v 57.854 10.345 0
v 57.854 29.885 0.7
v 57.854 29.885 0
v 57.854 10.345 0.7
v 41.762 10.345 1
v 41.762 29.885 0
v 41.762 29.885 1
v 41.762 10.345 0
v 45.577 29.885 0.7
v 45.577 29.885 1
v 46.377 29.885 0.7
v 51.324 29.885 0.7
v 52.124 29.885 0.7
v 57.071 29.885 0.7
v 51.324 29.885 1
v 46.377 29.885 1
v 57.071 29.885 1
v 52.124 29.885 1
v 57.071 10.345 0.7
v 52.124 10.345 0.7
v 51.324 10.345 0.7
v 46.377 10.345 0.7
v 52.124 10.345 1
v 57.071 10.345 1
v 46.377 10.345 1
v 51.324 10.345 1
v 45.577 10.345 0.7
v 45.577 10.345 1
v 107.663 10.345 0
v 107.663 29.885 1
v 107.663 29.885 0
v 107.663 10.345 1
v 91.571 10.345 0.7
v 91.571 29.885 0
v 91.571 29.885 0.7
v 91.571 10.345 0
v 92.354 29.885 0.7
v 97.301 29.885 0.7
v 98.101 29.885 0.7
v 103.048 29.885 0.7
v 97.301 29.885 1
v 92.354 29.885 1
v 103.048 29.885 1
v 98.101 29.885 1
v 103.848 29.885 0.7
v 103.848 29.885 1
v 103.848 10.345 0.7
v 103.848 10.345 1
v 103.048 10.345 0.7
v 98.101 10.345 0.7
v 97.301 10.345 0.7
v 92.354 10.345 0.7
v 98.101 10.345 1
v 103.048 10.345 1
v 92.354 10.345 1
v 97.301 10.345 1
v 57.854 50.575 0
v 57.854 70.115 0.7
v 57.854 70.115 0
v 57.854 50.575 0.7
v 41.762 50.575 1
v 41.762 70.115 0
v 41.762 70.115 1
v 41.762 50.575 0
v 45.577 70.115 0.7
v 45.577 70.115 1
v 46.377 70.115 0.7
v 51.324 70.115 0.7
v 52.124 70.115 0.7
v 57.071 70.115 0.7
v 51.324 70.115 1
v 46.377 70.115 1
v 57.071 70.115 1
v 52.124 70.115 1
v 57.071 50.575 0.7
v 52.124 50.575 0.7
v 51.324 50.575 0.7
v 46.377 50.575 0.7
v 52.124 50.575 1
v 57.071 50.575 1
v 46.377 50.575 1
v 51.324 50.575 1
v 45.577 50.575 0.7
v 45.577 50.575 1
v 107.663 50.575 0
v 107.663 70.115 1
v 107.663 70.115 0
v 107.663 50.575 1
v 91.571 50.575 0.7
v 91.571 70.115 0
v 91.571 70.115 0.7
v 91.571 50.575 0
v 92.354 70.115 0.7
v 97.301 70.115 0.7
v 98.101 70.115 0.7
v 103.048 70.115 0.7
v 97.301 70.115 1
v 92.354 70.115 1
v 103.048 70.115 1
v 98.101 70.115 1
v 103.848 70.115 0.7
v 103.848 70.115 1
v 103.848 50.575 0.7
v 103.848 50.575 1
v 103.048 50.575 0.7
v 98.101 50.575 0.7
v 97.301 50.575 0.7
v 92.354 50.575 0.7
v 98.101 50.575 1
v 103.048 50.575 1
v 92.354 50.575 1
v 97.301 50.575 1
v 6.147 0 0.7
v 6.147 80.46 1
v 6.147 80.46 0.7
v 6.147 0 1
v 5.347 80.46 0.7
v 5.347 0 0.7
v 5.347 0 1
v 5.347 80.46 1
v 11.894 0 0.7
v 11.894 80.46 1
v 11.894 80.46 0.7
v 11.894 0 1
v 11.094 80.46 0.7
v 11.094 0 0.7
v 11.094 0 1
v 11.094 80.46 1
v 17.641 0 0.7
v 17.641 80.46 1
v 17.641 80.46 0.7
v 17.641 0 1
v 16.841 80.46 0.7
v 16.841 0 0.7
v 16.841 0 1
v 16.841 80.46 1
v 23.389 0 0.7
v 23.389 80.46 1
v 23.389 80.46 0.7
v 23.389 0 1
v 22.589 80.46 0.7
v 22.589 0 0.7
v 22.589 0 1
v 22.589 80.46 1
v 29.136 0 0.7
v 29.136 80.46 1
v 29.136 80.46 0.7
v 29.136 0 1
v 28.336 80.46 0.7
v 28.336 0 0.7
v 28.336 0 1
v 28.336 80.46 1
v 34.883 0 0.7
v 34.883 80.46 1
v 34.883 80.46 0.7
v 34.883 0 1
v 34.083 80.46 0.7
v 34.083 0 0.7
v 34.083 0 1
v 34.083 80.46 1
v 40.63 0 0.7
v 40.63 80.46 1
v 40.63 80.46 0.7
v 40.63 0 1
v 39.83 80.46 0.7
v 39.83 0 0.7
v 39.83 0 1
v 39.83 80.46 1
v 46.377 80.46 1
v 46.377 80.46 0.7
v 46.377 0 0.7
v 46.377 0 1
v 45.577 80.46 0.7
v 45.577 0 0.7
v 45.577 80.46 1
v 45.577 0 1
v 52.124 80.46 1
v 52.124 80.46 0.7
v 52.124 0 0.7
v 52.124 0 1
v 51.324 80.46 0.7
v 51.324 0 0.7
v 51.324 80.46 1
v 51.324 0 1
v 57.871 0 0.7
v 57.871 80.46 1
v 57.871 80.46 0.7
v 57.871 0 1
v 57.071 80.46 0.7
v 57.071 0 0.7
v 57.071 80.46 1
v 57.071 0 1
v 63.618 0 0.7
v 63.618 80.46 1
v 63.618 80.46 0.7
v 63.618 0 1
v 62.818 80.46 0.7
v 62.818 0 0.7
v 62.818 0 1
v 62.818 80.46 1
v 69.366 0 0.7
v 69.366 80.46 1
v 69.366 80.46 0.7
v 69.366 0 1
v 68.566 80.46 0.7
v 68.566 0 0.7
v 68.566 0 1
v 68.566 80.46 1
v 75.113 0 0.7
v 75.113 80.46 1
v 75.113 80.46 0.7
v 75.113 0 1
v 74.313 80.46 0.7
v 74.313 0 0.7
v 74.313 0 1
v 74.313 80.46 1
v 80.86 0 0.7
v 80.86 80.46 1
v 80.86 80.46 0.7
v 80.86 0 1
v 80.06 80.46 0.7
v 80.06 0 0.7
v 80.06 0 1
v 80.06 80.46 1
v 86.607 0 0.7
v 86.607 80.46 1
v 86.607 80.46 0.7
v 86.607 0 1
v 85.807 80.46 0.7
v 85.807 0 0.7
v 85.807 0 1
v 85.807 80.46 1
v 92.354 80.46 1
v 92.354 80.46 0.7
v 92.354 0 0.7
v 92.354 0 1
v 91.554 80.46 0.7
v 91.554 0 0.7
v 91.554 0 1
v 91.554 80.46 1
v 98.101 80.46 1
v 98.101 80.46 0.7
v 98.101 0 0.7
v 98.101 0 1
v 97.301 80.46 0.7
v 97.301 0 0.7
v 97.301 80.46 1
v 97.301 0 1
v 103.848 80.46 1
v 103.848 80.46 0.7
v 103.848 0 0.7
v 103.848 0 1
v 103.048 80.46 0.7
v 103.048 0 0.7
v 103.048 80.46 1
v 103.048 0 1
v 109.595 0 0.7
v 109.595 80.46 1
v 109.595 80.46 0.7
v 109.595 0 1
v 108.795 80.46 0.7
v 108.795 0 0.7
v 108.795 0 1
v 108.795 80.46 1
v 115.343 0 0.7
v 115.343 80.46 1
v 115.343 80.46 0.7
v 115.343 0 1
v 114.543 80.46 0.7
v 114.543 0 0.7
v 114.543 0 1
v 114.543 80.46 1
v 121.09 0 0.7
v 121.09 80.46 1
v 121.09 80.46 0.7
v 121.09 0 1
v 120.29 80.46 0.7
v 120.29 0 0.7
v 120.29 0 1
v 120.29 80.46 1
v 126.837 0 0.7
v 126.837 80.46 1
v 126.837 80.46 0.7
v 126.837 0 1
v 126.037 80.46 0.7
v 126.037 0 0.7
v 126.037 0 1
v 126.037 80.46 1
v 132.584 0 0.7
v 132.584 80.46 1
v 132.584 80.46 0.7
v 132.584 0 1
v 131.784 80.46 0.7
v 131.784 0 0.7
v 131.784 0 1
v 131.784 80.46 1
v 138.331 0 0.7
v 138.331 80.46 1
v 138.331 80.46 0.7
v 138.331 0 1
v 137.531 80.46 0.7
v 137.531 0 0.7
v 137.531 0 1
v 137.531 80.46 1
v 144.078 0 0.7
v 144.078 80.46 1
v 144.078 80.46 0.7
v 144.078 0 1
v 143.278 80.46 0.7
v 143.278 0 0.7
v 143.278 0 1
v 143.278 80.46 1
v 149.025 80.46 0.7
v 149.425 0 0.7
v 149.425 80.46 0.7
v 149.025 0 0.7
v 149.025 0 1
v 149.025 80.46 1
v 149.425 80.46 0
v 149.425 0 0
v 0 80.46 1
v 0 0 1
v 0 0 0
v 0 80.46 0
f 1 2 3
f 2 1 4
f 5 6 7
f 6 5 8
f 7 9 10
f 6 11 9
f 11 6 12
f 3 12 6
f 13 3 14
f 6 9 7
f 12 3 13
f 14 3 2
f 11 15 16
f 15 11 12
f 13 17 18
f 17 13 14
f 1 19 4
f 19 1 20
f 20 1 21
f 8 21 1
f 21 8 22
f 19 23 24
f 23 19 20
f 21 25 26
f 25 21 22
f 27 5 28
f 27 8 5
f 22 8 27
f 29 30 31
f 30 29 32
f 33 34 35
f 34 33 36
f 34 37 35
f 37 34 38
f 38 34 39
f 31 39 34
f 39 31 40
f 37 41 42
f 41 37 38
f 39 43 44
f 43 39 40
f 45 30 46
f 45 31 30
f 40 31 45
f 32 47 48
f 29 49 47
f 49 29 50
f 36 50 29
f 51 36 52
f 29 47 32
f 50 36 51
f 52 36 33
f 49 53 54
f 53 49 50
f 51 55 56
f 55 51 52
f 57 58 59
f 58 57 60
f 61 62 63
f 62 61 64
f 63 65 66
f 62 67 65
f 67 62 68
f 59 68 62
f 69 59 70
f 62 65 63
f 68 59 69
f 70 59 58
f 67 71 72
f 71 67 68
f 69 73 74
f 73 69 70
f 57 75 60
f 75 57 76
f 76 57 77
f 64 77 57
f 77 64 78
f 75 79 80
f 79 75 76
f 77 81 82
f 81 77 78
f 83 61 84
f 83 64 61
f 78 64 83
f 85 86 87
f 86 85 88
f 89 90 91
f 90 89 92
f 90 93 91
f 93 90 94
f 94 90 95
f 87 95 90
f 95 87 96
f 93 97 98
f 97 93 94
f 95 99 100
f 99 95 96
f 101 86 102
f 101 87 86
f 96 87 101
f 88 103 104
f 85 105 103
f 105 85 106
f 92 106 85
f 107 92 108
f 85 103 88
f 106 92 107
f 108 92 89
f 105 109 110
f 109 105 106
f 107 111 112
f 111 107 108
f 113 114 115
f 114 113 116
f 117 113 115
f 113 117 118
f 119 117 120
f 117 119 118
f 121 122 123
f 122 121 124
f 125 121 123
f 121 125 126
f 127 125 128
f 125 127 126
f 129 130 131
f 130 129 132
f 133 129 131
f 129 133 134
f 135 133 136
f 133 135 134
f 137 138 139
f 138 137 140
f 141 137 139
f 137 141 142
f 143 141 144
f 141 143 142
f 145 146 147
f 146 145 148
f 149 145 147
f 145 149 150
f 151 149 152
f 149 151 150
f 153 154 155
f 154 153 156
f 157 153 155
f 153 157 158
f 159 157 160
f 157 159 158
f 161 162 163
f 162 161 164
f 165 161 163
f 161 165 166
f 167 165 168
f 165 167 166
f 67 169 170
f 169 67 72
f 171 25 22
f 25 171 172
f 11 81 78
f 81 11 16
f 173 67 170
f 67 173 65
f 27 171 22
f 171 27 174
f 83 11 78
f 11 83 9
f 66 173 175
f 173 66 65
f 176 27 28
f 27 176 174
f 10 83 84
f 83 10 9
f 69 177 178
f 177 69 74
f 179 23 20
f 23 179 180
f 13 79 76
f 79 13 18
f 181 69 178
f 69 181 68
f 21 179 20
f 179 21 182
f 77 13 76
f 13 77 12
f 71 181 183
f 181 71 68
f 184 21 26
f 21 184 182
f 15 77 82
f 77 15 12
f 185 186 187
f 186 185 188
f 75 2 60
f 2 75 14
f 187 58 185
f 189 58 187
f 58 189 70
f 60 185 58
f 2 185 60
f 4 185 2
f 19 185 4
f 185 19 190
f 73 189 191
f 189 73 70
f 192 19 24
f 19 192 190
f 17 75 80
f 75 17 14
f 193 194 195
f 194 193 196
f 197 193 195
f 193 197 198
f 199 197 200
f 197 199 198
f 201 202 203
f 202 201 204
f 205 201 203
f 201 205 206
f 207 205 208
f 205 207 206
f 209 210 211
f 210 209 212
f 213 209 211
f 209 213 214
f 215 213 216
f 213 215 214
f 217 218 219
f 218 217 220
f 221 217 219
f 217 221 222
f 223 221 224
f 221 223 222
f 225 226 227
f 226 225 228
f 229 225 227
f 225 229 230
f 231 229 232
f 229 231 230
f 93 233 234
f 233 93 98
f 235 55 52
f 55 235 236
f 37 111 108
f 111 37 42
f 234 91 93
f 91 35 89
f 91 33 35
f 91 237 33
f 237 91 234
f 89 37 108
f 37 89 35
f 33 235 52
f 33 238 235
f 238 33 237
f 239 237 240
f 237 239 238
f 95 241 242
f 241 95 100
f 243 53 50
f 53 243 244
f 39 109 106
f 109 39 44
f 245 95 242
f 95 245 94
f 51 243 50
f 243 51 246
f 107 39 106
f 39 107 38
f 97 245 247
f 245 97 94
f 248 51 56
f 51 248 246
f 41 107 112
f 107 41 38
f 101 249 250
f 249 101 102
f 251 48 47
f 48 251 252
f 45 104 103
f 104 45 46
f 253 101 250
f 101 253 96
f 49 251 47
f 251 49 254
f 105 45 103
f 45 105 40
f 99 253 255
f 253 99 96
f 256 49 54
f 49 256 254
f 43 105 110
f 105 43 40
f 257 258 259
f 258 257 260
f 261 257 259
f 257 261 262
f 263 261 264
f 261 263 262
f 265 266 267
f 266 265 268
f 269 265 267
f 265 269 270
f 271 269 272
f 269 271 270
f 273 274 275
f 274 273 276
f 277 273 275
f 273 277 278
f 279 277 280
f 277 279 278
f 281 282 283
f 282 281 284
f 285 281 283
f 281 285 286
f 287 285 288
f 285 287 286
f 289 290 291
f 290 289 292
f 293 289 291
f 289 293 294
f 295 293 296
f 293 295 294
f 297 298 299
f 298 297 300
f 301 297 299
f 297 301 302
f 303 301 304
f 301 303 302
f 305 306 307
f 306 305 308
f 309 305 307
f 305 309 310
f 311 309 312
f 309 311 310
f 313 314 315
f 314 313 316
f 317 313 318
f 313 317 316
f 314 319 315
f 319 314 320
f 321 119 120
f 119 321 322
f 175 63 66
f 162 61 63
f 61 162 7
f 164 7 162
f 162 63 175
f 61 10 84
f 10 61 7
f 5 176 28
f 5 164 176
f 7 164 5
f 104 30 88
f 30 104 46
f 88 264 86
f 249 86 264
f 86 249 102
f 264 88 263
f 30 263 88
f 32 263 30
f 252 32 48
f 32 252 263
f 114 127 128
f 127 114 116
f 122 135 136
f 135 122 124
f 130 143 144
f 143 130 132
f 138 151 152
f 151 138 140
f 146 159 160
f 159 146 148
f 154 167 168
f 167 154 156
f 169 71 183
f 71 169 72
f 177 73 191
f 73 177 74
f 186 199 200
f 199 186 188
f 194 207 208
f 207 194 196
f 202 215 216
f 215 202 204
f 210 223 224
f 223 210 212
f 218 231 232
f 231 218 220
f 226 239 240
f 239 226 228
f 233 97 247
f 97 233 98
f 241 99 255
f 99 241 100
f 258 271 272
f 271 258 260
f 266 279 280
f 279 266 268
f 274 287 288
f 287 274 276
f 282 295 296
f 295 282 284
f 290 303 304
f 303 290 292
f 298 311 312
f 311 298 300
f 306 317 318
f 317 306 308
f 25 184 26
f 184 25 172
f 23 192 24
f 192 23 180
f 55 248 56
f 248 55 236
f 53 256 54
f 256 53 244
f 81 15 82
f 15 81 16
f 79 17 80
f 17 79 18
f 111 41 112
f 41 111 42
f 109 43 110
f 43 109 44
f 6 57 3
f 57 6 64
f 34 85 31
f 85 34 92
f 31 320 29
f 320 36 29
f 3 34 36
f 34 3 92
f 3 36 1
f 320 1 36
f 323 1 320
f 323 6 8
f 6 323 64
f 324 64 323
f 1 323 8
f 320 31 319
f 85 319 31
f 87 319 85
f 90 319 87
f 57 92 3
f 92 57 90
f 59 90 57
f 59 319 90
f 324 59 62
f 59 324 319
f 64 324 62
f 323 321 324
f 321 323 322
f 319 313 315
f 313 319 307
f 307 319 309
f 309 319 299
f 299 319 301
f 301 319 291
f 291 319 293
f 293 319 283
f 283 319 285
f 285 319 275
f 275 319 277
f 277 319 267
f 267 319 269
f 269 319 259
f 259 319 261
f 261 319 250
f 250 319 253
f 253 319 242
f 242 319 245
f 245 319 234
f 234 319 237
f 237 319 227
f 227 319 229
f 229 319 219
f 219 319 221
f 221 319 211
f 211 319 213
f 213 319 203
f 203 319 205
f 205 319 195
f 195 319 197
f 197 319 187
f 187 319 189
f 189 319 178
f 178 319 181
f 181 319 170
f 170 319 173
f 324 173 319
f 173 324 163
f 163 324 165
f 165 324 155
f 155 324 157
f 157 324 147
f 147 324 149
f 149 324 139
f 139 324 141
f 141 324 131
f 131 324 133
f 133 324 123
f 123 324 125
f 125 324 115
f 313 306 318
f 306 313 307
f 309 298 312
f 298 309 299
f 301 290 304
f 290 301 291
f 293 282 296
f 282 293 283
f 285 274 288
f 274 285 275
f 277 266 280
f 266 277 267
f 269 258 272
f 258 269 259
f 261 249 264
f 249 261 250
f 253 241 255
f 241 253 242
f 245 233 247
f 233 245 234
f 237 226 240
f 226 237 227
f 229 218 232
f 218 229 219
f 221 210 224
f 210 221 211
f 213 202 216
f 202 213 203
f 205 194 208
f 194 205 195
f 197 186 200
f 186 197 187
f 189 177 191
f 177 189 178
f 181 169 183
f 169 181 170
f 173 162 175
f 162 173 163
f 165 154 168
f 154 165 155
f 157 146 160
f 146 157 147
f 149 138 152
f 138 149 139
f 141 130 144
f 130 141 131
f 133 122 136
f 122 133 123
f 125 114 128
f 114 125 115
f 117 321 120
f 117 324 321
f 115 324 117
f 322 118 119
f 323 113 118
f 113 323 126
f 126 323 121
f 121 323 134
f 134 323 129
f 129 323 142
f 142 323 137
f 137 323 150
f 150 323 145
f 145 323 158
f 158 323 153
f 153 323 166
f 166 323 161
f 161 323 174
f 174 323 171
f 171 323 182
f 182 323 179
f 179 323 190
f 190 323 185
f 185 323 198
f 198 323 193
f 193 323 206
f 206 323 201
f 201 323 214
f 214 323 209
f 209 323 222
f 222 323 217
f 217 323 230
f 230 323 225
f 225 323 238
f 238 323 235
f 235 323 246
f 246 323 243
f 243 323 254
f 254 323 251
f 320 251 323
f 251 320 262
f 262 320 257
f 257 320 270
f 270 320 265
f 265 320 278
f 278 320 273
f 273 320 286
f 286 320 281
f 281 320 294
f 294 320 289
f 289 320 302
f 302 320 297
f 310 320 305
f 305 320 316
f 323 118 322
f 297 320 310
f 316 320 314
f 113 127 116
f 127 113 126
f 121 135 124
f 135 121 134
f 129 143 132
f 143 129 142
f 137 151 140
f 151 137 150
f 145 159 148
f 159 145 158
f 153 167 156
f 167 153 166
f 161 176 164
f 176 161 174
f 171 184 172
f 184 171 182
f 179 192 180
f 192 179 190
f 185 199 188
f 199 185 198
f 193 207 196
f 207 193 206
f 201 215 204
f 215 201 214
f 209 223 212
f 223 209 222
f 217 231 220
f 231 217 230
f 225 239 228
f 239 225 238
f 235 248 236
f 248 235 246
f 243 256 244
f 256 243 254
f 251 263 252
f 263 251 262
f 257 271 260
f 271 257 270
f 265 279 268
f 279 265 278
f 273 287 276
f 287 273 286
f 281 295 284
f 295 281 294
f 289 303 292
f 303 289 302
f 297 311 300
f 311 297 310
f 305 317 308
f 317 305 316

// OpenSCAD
/*
 * PROMPT: Left side wall panel of the Cities-Skylines-style police station main
 * building in H0 scale (1:87). Two large windows per floor at one-third and
 * two-thirds depth positions (four windows total). Vertical siding grooves on
 * exterior face. Flat 1 mm panel, exterior face up.
 */

$fn = 32;
S = 1/87;
panel_t = 1.0;

main_d_real   = 13000;
floor_h_real  = 3500;
win_w_real    = 1400;
win_h_real    = 1700;
siding_p_real = 500;
siding_w      = 0.8;
siding_d      = 0.3;

main_d   = main_d_real * S;
floor_h  = floor_h_real * S;
bld_h    = 2 * floor_h;
win_w    = win_w_real * S;
win_h    = win_h_real * S;
siding_p = siding_p_real * S;

module wall_left() {
    difference() {
        cube([main_d, bld_h, panel_t]);

        // windows at 1/3 and 2/3 depth, both floors
        for (f = [0:1]) for (pos = [1/3, 2/3]) {
            wx = pos * main_d - win_w/2;
            wy = f * floor_h + (floor_h - win_h) / 2;
            translate([wx, wy, -1])
                cube([win_w, win_h, panel_t+2]);
        }

        // vertical siding grooves on exterior face
        for (i = [1 : floor(main_d / siding_p)]) {
            gx = i * siding_p - siding_w/2;
            translate([gx, -1, panel_t - siding_d])
                cube([siding_w, bld_h+2, siding_d+1]);
        }
    }
}

wall_left();
